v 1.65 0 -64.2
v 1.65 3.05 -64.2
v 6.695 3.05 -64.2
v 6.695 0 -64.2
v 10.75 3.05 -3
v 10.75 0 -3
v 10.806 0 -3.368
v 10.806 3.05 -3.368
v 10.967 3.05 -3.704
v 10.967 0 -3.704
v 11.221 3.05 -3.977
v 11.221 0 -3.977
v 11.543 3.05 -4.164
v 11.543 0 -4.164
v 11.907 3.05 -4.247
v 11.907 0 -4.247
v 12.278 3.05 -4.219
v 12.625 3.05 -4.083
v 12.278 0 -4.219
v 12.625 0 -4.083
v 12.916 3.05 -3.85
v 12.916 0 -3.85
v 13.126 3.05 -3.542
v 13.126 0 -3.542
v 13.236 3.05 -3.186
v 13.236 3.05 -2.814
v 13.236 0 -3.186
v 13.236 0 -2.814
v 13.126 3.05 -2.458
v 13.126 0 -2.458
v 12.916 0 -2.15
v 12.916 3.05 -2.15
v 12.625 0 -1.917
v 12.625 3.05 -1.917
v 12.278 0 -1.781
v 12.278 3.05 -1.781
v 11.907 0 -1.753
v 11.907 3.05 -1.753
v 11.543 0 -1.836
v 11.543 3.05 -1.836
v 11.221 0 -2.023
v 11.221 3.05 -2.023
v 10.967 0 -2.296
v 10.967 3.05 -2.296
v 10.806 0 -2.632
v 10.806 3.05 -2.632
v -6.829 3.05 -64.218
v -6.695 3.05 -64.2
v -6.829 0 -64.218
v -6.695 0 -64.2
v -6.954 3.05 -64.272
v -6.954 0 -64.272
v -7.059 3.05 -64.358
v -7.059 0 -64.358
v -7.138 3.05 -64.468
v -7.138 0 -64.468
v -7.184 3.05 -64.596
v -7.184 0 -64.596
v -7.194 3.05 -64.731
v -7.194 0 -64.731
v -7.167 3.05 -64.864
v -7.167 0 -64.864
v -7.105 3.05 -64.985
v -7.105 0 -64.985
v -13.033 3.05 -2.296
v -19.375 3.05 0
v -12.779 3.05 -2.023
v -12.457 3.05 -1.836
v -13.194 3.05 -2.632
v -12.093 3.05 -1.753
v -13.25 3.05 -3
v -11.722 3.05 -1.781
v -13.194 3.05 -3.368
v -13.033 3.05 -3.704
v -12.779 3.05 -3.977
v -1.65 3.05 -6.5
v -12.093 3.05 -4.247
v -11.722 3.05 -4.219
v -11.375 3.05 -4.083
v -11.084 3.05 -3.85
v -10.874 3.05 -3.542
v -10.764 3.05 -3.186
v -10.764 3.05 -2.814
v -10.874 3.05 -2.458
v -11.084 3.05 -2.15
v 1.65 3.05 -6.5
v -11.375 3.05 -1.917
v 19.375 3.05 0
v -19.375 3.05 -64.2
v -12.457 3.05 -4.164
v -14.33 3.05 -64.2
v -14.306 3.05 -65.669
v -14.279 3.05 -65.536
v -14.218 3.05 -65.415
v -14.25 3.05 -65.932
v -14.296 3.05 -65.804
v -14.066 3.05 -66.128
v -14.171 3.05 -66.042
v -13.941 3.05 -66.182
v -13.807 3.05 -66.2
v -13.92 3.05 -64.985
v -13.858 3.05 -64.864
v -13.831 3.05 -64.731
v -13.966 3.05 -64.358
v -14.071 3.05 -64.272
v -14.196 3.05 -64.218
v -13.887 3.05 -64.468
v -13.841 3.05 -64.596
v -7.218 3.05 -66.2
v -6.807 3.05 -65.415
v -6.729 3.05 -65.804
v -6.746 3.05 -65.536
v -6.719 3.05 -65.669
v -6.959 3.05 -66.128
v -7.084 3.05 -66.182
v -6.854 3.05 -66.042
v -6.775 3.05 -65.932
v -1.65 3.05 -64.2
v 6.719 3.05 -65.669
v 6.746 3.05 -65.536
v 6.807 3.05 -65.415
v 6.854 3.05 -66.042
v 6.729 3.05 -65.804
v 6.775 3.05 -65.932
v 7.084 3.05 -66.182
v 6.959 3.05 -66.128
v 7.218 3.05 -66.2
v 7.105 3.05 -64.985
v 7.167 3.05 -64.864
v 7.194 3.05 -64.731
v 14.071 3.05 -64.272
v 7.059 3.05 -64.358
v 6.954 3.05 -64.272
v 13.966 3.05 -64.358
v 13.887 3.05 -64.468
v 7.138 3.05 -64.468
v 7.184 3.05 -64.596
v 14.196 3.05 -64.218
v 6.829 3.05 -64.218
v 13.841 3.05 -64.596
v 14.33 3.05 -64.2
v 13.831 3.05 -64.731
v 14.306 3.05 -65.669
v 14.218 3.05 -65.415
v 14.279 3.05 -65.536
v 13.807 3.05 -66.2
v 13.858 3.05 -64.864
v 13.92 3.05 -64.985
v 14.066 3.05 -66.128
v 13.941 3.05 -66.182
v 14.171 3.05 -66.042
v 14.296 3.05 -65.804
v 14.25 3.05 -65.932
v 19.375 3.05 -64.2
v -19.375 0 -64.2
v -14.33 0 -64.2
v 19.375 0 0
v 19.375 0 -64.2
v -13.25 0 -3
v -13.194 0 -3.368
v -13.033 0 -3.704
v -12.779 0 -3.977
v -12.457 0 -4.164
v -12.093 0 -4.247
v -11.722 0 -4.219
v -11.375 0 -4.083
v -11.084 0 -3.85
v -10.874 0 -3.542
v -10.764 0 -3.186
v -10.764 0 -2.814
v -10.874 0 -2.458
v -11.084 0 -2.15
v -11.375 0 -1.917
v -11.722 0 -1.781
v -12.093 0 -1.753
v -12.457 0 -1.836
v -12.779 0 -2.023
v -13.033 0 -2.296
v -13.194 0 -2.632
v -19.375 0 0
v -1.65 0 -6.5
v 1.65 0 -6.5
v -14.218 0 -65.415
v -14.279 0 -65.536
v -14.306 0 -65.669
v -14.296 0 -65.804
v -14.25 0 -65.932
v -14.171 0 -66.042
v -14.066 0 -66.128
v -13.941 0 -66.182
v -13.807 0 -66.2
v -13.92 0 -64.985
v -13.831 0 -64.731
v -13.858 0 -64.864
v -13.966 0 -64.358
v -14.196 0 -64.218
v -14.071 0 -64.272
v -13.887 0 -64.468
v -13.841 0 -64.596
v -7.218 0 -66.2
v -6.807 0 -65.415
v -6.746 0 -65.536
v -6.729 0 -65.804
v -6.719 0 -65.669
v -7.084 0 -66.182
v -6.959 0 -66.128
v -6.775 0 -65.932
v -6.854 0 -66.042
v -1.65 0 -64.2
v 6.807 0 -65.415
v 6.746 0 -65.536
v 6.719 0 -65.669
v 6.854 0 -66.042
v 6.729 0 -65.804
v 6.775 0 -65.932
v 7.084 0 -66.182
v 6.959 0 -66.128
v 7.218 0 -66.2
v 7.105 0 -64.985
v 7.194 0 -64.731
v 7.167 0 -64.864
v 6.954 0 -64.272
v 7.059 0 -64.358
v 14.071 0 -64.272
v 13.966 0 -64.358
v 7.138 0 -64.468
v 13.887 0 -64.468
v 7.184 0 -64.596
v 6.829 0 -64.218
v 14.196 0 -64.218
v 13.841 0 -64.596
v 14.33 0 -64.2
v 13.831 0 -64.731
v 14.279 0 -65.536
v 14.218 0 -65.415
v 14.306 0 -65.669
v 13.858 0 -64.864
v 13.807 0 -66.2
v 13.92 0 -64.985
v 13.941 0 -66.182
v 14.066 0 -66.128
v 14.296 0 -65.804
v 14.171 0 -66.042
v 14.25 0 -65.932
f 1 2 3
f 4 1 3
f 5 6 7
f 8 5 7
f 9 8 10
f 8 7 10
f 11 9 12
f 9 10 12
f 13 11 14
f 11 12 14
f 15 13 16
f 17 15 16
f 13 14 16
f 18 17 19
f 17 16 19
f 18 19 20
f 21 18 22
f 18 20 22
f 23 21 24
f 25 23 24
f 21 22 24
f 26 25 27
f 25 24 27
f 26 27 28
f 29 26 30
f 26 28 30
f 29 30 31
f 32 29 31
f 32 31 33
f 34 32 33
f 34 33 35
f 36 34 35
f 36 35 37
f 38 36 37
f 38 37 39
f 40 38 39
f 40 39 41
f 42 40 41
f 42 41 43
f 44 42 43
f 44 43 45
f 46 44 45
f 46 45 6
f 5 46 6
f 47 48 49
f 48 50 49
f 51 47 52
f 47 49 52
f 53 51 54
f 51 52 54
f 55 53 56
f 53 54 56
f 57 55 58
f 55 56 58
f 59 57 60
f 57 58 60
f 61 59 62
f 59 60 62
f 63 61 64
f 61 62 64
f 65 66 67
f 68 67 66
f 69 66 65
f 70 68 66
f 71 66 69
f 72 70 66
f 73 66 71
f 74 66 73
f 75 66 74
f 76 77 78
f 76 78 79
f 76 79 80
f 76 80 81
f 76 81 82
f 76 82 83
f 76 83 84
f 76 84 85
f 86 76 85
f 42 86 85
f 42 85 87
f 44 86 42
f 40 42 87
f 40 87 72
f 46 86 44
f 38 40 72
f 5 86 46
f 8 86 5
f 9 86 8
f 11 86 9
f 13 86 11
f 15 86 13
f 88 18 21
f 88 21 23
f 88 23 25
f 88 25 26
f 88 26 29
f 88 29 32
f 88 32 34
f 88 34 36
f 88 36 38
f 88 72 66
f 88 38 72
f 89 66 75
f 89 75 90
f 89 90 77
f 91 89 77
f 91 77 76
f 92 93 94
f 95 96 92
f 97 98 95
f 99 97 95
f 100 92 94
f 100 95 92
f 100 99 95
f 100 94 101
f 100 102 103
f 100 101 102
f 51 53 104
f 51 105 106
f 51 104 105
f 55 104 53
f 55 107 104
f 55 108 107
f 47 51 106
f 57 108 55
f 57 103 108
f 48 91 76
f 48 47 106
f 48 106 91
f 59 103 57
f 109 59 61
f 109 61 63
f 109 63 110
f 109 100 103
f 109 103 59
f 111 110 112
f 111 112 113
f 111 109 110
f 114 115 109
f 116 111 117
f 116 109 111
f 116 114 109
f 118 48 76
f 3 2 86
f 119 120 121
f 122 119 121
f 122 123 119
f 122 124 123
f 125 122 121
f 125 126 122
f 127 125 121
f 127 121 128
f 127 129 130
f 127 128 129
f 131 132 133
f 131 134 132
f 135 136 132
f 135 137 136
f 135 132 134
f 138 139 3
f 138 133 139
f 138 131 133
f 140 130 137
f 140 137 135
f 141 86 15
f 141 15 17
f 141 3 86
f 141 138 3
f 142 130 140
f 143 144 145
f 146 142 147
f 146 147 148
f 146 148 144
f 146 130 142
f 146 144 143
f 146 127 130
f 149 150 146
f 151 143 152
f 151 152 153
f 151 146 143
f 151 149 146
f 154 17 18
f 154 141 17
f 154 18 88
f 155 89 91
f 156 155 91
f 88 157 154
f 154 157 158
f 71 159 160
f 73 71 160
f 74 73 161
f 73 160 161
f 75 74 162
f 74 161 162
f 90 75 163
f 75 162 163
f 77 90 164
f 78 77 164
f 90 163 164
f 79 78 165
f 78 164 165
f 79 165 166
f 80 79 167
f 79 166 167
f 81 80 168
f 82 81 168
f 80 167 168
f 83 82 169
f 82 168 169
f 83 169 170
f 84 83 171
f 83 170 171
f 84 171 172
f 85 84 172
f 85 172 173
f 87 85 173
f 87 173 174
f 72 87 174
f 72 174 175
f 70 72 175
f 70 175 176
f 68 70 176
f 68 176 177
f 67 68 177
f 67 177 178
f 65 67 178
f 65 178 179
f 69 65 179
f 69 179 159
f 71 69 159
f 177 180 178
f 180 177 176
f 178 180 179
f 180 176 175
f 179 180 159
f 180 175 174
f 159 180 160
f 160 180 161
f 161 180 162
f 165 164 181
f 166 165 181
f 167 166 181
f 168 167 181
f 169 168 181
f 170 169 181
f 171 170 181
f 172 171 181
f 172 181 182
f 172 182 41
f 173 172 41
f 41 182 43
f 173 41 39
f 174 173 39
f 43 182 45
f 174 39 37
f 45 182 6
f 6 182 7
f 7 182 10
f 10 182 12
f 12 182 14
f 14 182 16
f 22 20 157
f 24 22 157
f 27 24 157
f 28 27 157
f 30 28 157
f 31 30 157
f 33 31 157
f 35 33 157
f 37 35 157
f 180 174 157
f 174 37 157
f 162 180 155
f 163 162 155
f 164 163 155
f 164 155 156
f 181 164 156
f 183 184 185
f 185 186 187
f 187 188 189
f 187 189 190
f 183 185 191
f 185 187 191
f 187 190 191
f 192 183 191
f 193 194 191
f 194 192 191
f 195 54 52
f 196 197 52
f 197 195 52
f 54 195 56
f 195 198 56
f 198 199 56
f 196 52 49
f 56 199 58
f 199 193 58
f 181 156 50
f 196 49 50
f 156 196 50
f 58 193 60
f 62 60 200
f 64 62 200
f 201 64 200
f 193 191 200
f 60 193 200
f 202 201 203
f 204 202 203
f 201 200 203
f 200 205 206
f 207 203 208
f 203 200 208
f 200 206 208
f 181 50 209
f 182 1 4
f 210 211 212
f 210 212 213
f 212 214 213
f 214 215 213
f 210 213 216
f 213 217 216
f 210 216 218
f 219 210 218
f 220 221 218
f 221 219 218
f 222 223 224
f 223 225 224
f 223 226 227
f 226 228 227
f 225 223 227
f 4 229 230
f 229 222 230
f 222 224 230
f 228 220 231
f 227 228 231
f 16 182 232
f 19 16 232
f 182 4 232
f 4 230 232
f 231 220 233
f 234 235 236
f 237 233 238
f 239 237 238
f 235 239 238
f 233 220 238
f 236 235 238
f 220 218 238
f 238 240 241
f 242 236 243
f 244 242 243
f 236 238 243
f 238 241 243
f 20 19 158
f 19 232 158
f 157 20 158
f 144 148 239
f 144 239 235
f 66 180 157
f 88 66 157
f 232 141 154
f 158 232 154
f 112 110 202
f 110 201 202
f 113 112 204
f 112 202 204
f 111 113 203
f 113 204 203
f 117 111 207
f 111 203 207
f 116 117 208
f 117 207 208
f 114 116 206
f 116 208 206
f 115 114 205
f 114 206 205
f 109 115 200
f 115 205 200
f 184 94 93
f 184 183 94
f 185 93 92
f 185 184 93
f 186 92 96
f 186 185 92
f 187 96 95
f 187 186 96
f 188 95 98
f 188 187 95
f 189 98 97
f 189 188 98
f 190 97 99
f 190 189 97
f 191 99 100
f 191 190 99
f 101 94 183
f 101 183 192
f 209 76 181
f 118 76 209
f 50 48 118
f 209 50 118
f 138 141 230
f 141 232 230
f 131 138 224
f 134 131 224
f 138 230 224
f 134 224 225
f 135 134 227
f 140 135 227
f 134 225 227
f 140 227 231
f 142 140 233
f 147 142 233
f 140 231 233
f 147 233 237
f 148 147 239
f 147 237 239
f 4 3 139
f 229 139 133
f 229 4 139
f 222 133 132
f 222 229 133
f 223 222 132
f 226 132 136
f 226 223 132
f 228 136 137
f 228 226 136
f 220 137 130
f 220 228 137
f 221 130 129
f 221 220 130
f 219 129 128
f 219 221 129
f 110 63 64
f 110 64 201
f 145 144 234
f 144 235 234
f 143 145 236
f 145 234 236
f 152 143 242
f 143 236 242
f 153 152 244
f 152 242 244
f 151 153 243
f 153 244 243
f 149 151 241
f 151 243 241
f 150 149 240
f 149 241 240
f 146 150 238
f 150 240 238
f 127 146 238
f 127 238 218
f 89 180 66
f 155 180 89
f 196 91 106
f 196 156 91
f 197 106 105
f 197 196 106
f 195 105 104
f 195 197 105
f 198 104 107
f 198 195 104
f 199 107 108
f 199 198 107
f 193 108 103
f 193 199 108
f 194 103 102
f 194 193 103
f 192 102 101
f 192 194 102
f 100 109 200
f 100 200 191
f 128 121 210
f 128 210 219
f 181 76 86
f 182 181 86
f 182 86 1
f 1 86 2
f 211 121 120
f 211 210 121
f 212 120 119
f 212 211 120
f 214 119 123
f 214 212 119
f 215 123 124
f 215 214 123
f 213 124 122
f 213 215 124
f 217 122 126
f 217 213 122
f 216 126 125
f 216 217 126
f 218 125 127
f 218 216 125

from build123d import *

# Parameters (mm, degrees)
SKETCH1_W                   = 38.75
SKETCH1_H                   = 72.5
BOSS_EXTRUDE1_DEPTH         = 3.05
SKETCH4_W                   = 1.65
SKETCH4_H                   = 1
SKETCH4_H_2                 = 61.8
CUT_EXTRUDE1_DEPTH          = 76.106212293
SKETCH8_W                   = 38.75
SKETCH8_H                   = 8.3
CUT_EXTRUDE5_DEPTH          = 76.106212293
BOSS_EXTRUDE3_DEPTH         = 3.05
FILLET2_R                   = 0.5
TAP_DRILL_FOR_M3X0_5_TAP1_D = 2.5


with BuildPart() as part:
    # Sketch1 → Boss-Extrude1 (new body)
    with BuildSketch(Plane(origin=(0, 0, 0), x_dir=(1, 0, 0), z_dir=(0, 1, 0))):
        with Locations((0, 36.25)):
            Rectangle(SKETCH1_W, SKETCH1_H)
    extrude(amount=BOSS_EXTRUDE1_DEPTH)

    # Sketch4 → Cut-Extrude1 (cut, through all)
    with BuildSketch(Plane(origin=(0, 3.05, 0), x_dir=(1, 0, 0), z_dir=(0, 1, 0))):
        with Locations((-0.825, 70)):
            Rectangle(SKETCH4_W, SKETCH4_H)
        with Locations((-0.825, 37.4)):
            Rectangle(SKETCH4_W, SKETCH4_H_2)
        with Locations((0.825, 37.4)):
            Rectangle(SKETCH4_W, SKETCH4_H_2)
        with Locations((0.825, 70)):
            Rectangle(SKETCH4_W, SKETCH4_H)
    extrude(amount=-CUT_EXTRUDE1_DEPTH, mode=Mode.SUBTRACT)

    # Sketch8 → Cut-Extrude5 (cut, through all)
    with BuildSketch(Plane(origin=(0, 3.05, 0), x_dir=(1, 0, 0), z_dir=(0, 1, 0))):
        with Locations((0, 68.35)):
            Rectangle(SKETCH8_W, SKETCH8_H)
    extrude(amount=-CUT_EXTRUDE5_DEPTH, mode=Mode.SUBTRACT)

    # Sketch9 → Boss-Extrude3 (add)
    with BuildSketch(Plane(origin=(0, 3.05, 0), x_dir=(1, 0, 0), z_dir=(0, 1, 0))):
        Polygon((-14.7625, 66.2), (-13.375, 64.2), (-7.65, 64.2), (-6.2625, 66.2), align=None)
        Polygon((6.2625, 66.2), (7.65, 64.2), (13.375, 64.2), (14.7625, 66.2), align=None)
    extrude(amount=-BOSS_EXTRUDE3_DEPTH)

    # Fillet2
    fillet2_edges = [part.edges().sort_by_distance(p)[0] for p in [
        (14.7625, 1.525, -66.2),
        (13.375, 1.525, -64.2),
        (7.65, 1.525, -64.2),
        (6.2625, 1.525, -66.2),
        (-6.2625, 1.525, -66.2),
        (-7.65, 1.525, -64.2),
        (-13.375, 1.525, -64.2),
        (-14.7625, 1.525, -66.2),
    ]]
    fillet(fillet2_edges, radius=FILLET2_R)

    # Tap Drill for M3x0.5 Tap1 (through all)
    with Locations(Plane(origin=(0, 3.05, 0), x_dir=(1, 0, 0), z_dir=(0, 1, 0))):
        with Locations((-12, 3), (12, 3)):
            Hole(TAP_DRILL_FOR_M3X0_5_TAP1_D / 2)


solid = part.part
